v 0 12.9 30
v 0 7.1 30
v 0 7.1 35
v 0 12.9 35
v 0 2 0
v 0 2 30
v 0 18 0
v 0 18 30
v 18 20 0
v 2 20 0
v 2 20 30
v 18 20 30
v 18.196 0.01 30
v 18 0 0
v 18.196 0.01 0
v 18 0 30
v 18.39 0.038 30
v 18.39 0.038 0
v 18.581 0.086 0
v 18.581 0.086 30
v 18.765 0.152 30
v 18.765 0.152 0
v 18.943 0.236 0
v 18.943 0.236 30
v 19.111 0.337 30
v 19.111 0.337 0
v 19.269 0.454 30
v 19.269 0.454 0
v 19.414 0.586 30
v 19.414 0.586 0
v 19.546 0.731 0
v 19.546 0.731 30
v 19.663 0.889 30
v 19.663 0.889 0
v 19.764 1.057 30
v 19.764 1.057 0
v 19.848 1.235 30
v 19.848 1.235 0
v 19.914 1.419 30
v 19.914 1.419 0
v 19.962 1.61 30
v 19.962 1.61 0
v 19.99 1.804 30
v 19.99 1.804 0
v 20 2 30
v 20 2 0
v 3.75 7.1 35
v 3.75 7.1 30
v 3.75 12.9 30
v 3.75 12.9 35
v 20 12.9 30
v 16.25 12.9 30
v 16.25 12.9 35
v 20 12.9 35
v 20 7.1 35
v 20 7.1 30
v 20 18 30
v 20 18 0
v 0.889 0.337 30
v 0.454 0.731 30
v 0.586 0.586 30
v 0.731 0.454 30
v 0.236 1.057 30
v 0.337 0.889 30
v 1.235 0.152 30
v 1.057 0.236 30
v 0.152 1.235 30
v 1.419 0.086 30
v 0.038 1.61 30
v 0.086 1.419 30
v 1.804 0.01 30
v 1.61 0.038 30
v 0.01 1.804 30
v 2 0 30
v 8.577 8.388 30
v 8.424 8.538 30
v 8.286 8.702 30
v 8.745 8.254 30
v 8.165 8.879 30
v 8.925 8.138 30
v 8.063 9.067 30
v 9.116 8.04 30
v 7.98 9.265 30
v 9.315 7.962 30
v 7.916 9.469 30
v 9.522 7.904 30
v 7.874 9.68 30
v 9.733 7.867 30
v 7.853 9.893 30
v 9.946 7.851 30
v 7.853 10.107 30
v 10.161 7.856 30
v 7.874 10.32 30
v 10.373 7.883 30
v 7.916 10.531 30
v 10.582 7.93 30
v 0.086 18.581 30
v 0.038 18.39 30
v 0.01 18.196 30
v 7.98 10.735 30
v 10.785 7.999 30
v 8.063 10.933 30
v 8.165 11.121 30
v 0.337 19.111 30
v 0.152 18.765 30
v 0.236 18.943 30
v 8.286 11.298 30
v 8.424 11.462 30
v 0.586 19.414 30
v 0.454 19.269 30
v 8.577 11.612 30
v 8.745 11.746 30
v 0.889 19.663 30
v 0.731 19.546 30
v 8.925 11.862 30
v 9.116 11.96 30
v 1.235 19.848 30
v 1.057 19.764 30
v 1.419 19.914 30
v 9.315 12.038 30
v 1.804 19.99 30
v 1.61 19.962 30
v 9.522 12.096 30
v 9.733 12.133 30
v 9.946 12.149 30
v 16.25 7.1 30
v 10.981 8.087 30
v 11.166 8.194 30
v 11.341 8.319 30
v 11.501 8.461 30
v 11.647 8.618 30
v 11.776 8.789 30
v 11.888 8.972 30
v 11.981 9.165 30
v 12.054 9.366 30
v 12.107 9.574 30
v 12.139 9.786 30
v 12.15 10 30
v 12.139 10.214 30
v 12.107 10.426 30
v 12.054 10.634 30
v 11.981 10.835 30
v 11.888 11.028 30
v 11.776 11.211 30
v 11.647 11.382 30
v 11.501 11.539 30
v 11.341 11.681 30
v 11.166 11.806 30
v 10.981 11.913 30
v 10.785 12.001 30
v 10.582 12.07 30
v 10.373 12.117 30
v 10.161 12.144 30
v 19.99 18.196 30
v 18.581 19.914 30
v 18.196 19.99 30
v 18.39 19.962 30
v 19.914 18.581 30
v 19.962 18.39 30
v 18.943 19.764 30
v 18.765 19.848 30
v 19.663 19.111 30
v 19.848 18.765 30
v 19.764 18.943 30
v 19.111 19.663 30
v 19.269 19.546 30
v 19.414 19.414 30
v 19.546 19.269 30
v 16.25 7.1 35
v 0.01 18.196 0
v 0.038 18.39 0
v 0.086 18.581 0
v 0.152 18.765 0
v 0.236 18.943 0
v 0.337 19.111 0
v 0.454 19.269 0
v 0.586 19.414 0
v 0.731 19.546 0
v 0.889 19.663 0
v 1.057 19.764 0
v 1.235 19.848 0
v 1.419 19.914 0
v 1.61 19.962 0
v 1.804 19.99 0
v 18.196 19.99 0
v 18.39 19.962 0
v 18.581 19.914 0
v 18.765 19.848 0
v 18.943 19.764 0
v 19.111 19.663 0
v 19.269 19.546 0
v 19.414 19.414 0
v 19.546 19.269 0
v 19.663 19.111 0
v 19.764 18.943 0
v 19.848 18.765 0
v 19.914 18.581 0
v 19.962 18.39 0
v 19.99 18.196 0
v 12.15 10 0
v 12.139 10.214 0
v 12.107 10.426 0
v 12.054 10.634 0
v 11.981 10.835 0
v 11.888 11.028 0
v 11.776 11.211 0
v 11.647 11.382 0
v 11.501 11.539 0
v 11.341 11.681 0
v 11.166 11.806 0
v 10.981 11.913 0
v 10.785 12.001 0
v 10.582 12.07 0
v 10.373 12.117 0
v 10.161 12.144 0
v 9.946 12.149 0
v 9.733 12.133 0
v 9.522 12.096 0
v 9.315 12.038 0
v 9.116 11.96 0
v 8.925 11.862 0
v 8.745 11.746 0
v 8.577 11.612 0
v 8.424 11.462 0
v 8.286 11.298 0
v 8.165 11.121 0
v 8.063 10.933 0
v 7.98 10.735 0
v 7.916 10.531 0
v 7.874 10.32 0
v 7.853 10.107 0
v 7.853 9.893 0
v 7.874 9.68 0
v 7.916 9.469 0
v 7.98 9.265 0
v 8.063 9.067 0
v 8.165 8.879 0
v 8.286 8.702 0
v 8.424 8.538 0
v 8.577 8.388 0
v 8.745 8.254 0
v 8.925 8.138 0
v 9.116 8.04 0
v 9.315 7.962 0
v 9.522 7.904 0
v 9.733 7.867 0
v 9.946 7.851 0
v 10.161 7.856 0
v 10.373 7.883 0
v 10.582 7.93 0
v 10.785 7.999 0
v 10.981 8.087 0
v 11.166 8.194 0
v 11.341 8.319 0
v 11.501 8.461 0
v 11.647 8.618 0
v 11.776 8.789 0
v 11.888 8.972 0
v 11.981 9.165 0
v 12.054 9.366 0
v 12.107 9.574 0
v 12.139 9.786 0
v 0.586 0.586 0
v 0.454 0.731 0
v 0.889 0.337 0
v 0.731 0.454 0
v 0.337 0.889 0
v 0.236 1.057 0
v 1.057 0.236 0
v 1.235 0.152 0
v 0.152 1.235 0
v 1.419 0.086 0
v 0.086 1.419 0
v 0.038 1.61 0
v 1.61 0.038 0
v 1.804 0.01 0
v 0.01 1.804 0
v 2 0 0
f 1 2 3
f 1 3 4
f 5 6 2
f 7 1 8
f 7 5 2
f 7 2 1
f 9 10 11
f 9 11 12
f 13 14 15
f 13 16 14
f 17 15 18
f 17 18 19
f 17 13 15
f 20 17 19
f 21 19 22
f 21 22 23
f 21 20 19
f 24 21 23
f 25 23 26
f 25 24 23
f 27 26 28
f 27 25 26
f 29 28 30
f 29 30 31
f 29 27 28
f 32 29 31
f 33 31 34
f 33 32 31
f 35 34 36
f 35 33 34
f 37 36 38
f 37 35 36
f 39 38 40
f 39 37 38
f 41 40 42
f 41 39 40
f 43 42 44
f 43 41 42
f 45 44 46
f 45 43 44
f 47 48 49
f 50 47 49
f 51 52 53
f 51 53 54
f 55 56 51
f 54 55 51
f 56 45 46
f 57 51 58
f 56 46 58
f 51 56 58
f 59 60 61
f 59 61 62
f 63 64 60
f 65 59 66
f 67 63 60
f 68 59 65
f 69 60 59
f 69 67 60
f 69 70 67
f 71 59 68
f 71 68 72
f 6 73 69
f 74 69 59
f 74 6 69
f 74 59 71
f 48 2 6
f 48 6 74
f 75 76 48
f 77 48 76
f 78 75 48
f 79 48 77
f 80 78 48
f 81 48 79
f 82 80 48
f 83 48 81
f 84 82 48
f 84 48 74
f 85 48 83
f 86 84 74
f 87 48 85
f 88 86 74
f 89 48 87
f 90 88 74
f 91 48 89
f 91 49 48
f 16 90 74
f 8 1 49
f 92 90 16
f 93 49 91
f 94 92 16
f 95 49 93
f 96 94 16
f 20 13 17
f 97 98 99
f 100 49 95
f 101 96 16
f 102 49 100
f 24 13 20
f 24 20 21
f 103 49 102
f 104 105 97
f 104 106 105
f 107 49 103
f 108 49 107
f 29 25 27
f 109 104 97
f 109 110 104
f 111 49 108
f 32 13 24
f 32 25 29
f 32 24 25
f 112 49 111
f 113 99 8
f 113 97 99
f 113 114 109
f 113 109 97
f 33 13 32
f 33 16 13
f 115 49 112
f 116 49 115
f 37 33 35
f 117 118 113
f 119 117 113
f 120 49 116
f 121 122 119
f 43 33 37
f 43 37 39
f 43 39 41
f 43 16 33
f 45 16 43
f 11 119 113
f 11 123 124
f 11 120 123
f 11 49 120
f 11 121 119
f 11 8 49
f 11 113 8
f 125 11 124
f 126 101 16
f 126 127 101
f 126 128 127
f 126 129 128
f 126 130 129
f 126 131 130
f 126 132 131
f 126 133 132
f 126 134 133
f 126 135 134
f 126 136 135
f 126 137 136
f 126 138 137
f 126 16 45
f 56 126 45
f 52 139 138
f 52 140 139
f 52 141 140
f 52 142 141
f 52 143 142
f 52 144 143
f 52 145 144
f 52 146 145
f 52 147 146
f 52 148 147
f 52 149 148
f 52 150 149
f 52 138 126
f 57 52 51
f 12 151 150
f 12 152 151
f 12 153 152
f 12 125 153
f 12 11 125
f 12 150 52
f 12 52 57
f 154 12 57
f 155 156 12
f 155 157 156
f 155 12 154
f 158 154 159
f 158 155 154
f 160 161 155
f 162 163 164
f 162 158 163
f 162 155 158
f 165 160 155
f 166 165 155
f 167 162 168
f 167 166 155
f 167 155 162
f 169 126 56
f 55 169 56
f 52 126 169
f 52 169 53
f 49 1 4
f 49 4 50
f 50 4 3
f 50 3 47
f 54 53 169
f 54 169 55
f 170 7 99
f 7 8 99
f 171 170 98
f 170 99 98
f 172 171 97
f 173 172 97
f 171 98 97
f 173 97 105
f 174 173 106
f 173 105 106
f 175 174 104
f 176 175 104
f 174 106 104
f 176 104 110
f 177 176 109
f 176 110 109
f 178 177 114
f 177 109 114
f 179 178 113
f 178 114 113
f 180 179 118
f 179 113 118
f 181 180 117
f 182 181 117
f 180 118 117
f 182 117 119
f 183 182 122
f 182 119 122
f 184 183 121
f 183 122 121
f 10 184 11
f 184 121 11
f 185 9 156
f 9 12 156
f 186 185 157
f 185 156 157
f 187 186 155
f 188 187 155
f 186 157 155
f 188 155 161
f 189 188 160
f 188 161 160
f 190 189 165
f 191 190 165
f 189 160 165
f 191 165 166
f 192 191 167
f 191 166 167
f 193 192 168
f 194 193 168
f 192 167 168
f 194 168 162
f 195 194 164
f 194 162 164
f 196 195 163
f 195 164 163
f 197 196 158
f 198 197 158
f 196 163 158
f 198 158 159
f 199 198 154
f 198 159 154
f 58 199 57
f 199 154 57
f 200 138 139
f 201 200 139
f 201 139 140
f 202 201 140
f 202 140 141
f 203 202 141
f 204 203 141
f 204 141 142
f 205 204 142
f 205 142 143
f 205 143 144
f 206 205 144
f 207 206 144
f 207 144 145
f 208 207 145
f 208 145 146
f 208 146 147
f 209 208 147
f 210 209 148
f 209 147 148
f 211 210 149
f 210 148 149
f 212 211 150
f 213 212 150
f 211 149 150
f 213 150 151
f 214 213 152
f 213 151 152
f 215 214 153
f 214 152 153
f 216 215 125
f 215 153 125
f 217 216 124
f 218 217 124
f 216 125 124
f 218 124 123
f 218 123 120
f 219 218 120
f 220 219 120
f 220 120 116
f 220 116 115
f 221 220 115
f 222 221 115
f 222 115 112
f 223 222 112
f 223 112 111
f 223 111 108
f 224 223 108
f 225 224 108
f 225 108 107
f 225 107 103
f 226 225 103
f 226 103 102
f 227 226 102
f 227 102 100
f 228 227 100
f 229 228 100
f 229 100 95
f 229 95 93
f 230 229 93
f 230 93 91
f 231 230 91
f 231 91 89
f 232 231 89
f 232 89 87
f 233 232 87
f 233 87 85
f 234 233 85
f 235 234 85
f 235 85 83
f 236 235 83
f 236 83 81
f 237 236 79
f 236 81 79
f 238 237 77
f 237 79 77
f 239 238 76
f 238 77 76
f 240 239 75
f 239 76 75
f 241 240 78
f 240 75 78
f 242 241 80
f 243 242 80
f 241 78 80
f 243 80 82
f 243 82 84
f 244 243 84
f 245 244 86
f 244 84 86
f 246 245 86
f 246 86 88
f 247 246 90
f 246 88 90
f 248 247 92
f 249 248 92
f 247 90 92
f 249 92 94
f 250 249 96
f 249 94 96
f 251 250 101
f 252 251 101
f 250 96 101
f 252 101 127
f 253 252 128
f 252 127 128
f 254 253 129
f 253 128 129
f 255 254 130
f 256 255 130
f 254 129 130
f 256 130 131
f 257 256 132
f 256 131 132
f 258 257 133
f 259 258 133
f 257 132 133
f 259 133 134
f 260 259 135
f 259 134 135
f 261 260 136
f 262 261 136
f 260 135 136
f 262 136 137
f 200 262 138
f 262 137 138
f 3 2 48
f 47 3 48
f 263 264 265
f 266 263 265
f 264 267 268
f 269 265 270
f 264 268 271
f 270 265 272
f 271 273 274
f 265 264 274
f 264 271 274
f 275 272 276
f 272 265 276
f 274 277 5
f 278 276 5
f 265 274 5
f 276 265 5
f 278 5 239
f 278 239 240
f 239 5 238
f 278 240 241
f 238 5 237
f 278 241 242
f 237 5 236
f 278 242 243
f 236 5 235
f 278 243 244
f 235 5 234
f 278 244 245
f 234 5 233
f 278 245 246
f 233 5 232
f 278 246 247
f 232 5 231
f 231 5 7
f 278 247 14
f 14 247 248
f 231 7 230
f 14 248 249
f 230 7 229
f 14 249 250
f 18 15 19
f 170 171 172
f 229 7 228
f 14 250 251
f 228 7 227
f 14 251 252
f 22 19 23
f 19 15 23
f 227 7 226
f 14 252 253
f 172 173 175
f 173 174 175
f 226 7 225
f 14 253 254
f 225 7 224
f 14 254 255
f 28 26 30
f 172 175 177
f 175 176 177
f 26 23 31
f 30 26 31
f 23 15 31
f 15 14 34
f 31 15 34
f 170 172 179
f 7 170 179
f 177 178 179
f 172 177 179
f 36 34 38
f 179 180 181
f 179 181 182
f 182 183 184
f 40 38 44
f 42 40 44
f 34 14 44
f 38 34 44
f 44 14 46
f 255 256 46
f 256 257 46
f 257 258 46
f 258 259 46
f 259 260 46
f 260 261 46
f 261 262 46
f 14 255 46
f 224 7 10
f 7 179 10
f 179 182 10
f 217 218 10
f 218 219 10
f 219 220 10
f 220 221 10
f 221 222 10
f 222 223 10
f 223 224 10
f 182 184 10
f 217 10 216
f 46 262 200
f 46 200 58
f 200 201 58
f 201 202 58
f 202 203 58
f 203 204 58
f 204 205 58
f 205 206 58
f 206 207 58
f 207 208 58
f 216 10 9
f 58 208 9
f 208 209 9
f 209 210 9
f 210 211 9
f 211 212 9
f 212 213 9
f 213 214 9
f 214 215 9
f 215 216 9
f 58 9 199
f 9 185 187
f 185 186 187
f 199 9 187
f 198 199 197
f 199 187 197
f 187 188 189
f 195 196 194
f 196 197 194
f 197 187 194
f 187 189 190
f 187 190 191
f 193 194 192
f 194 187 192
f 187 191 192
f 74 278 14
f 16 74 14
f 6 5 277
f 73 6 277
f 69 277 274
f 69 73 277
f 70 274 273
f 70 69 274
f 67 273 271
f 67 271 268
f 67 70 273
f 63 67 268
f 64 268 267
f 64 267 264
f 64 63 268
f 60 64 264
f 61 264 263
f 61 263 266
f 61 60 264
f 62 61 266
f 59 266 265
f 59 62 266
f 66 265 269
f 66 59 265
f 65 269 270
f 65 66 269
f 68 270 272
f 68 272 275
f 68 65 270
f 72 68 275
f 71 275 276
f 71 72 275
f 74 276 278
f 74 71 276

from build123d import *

# Parameters (mm, degrees)
F0_W     = 20
F0_H     = 20
F1_DEPTH = 30
F2_R     = 2.15
F3_DEPTH = 30.001
F4_R     = 2
F5_W     = 3.75
F5_H     = 5.8
F6_DEPTH = 5


with BuildPart() as f1:
    # F0 (on Top) → F1 (new body)
    with BuildSketch(Plane.XY):
        with Locations((10, 10)):
            Rectangle(F0_W, F0_H)
    extrude(amount=F1_DEPTH)

    # F2 (on face) → F3 (cut, through all)
    with BuildSketch(Plane.XY.offset(30)):
        with Locations((10, 10)):
            Circle(F2_R)
    extrude(amount=-F3_DEPTH, mode=Mode.SUBTRACT)

    # F4
    f4_edges = [f1.edges().sort_by_distance(p)[0] for p in [
        (20, 0, 15),
        (0, 0, 15),
        (20, 20, 15),
        (0, 20, 15),
    ]]
    fillet(f4_edges, radius=F4_R)

    # F5 (on face) → F6 (join)
    with BuildSketch(Plane.XY.offset(30)):
        with Locations((1.875, 10)):
            Rectangle(F5_W, F5_H)
        with Locations((18.125, 10)):
            Rectangle(F5_W, F5_H)
    extrude(amount=F6_DEPTH)


solid = f1.part
